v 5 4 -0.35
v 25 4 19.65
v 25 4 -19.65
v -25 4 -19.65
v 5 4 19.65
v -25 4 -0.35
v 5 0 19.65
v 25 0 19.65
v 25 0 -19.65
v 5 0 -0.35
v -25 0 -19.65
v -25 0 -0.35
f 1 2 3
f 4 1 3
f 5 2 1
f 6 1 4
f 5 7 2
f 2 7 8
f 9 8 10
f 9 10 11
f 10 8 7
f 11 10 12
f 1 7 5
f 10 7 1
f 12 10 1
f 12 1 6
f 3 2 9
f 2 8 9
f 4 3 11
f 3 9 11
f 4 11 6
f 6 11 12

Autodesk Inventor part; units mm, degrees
ref_plane "YZ Plane" through (0, 0, 0) normal (1, 0, 0) x (0, 1, 0)
ref_plane "XZ Plane" through (0, 0, 0) normal (0, 1, 0) x (-1, 0, 0)
ref_plane "XY Plane" through (0, 0, 0) normal (0, 0, 1) x (1, 0, 0)
sketch "Sketch1" plane through (0, 0, 0) normal (0, 1, 0) x (-1, 0, 0)
  line L0 (25, 19.65) -> (-25, 19.65)
  line L1 (-25, 19.65) -> (-25, -19.65)
  line L2 (-25, -19.65) -> (25, -19.65)
  line L3 (25, -19.65) -> (25, 19.65)
  line L4 (25, 19.65) -> (-25, -19.65) construction
  line L5 (-25, 19.65) -> (25, -19.65) construction
  line L6 (25, 19.65) -> (-5, 19.65)
  line L7 (-5, 19.65) -> (-5, -0.35)
  line L8 (-5, -0.35) -> (25, -0.35)
  line L9 (25, -0.35) -> (25, 19.65)
  point P0 (0, 0)
  dimension "d0" = 50
  dimension "d1" = 39.3
  dimension "d2" = 30
  dimension "d3" = 20
extrude "Extrusion1" add sketch "Sketch1" along normal blind 4 contours L7 L8 L3 L2 L1 L0
properties part number "Bracket Motor Lifter_3DPrint"
